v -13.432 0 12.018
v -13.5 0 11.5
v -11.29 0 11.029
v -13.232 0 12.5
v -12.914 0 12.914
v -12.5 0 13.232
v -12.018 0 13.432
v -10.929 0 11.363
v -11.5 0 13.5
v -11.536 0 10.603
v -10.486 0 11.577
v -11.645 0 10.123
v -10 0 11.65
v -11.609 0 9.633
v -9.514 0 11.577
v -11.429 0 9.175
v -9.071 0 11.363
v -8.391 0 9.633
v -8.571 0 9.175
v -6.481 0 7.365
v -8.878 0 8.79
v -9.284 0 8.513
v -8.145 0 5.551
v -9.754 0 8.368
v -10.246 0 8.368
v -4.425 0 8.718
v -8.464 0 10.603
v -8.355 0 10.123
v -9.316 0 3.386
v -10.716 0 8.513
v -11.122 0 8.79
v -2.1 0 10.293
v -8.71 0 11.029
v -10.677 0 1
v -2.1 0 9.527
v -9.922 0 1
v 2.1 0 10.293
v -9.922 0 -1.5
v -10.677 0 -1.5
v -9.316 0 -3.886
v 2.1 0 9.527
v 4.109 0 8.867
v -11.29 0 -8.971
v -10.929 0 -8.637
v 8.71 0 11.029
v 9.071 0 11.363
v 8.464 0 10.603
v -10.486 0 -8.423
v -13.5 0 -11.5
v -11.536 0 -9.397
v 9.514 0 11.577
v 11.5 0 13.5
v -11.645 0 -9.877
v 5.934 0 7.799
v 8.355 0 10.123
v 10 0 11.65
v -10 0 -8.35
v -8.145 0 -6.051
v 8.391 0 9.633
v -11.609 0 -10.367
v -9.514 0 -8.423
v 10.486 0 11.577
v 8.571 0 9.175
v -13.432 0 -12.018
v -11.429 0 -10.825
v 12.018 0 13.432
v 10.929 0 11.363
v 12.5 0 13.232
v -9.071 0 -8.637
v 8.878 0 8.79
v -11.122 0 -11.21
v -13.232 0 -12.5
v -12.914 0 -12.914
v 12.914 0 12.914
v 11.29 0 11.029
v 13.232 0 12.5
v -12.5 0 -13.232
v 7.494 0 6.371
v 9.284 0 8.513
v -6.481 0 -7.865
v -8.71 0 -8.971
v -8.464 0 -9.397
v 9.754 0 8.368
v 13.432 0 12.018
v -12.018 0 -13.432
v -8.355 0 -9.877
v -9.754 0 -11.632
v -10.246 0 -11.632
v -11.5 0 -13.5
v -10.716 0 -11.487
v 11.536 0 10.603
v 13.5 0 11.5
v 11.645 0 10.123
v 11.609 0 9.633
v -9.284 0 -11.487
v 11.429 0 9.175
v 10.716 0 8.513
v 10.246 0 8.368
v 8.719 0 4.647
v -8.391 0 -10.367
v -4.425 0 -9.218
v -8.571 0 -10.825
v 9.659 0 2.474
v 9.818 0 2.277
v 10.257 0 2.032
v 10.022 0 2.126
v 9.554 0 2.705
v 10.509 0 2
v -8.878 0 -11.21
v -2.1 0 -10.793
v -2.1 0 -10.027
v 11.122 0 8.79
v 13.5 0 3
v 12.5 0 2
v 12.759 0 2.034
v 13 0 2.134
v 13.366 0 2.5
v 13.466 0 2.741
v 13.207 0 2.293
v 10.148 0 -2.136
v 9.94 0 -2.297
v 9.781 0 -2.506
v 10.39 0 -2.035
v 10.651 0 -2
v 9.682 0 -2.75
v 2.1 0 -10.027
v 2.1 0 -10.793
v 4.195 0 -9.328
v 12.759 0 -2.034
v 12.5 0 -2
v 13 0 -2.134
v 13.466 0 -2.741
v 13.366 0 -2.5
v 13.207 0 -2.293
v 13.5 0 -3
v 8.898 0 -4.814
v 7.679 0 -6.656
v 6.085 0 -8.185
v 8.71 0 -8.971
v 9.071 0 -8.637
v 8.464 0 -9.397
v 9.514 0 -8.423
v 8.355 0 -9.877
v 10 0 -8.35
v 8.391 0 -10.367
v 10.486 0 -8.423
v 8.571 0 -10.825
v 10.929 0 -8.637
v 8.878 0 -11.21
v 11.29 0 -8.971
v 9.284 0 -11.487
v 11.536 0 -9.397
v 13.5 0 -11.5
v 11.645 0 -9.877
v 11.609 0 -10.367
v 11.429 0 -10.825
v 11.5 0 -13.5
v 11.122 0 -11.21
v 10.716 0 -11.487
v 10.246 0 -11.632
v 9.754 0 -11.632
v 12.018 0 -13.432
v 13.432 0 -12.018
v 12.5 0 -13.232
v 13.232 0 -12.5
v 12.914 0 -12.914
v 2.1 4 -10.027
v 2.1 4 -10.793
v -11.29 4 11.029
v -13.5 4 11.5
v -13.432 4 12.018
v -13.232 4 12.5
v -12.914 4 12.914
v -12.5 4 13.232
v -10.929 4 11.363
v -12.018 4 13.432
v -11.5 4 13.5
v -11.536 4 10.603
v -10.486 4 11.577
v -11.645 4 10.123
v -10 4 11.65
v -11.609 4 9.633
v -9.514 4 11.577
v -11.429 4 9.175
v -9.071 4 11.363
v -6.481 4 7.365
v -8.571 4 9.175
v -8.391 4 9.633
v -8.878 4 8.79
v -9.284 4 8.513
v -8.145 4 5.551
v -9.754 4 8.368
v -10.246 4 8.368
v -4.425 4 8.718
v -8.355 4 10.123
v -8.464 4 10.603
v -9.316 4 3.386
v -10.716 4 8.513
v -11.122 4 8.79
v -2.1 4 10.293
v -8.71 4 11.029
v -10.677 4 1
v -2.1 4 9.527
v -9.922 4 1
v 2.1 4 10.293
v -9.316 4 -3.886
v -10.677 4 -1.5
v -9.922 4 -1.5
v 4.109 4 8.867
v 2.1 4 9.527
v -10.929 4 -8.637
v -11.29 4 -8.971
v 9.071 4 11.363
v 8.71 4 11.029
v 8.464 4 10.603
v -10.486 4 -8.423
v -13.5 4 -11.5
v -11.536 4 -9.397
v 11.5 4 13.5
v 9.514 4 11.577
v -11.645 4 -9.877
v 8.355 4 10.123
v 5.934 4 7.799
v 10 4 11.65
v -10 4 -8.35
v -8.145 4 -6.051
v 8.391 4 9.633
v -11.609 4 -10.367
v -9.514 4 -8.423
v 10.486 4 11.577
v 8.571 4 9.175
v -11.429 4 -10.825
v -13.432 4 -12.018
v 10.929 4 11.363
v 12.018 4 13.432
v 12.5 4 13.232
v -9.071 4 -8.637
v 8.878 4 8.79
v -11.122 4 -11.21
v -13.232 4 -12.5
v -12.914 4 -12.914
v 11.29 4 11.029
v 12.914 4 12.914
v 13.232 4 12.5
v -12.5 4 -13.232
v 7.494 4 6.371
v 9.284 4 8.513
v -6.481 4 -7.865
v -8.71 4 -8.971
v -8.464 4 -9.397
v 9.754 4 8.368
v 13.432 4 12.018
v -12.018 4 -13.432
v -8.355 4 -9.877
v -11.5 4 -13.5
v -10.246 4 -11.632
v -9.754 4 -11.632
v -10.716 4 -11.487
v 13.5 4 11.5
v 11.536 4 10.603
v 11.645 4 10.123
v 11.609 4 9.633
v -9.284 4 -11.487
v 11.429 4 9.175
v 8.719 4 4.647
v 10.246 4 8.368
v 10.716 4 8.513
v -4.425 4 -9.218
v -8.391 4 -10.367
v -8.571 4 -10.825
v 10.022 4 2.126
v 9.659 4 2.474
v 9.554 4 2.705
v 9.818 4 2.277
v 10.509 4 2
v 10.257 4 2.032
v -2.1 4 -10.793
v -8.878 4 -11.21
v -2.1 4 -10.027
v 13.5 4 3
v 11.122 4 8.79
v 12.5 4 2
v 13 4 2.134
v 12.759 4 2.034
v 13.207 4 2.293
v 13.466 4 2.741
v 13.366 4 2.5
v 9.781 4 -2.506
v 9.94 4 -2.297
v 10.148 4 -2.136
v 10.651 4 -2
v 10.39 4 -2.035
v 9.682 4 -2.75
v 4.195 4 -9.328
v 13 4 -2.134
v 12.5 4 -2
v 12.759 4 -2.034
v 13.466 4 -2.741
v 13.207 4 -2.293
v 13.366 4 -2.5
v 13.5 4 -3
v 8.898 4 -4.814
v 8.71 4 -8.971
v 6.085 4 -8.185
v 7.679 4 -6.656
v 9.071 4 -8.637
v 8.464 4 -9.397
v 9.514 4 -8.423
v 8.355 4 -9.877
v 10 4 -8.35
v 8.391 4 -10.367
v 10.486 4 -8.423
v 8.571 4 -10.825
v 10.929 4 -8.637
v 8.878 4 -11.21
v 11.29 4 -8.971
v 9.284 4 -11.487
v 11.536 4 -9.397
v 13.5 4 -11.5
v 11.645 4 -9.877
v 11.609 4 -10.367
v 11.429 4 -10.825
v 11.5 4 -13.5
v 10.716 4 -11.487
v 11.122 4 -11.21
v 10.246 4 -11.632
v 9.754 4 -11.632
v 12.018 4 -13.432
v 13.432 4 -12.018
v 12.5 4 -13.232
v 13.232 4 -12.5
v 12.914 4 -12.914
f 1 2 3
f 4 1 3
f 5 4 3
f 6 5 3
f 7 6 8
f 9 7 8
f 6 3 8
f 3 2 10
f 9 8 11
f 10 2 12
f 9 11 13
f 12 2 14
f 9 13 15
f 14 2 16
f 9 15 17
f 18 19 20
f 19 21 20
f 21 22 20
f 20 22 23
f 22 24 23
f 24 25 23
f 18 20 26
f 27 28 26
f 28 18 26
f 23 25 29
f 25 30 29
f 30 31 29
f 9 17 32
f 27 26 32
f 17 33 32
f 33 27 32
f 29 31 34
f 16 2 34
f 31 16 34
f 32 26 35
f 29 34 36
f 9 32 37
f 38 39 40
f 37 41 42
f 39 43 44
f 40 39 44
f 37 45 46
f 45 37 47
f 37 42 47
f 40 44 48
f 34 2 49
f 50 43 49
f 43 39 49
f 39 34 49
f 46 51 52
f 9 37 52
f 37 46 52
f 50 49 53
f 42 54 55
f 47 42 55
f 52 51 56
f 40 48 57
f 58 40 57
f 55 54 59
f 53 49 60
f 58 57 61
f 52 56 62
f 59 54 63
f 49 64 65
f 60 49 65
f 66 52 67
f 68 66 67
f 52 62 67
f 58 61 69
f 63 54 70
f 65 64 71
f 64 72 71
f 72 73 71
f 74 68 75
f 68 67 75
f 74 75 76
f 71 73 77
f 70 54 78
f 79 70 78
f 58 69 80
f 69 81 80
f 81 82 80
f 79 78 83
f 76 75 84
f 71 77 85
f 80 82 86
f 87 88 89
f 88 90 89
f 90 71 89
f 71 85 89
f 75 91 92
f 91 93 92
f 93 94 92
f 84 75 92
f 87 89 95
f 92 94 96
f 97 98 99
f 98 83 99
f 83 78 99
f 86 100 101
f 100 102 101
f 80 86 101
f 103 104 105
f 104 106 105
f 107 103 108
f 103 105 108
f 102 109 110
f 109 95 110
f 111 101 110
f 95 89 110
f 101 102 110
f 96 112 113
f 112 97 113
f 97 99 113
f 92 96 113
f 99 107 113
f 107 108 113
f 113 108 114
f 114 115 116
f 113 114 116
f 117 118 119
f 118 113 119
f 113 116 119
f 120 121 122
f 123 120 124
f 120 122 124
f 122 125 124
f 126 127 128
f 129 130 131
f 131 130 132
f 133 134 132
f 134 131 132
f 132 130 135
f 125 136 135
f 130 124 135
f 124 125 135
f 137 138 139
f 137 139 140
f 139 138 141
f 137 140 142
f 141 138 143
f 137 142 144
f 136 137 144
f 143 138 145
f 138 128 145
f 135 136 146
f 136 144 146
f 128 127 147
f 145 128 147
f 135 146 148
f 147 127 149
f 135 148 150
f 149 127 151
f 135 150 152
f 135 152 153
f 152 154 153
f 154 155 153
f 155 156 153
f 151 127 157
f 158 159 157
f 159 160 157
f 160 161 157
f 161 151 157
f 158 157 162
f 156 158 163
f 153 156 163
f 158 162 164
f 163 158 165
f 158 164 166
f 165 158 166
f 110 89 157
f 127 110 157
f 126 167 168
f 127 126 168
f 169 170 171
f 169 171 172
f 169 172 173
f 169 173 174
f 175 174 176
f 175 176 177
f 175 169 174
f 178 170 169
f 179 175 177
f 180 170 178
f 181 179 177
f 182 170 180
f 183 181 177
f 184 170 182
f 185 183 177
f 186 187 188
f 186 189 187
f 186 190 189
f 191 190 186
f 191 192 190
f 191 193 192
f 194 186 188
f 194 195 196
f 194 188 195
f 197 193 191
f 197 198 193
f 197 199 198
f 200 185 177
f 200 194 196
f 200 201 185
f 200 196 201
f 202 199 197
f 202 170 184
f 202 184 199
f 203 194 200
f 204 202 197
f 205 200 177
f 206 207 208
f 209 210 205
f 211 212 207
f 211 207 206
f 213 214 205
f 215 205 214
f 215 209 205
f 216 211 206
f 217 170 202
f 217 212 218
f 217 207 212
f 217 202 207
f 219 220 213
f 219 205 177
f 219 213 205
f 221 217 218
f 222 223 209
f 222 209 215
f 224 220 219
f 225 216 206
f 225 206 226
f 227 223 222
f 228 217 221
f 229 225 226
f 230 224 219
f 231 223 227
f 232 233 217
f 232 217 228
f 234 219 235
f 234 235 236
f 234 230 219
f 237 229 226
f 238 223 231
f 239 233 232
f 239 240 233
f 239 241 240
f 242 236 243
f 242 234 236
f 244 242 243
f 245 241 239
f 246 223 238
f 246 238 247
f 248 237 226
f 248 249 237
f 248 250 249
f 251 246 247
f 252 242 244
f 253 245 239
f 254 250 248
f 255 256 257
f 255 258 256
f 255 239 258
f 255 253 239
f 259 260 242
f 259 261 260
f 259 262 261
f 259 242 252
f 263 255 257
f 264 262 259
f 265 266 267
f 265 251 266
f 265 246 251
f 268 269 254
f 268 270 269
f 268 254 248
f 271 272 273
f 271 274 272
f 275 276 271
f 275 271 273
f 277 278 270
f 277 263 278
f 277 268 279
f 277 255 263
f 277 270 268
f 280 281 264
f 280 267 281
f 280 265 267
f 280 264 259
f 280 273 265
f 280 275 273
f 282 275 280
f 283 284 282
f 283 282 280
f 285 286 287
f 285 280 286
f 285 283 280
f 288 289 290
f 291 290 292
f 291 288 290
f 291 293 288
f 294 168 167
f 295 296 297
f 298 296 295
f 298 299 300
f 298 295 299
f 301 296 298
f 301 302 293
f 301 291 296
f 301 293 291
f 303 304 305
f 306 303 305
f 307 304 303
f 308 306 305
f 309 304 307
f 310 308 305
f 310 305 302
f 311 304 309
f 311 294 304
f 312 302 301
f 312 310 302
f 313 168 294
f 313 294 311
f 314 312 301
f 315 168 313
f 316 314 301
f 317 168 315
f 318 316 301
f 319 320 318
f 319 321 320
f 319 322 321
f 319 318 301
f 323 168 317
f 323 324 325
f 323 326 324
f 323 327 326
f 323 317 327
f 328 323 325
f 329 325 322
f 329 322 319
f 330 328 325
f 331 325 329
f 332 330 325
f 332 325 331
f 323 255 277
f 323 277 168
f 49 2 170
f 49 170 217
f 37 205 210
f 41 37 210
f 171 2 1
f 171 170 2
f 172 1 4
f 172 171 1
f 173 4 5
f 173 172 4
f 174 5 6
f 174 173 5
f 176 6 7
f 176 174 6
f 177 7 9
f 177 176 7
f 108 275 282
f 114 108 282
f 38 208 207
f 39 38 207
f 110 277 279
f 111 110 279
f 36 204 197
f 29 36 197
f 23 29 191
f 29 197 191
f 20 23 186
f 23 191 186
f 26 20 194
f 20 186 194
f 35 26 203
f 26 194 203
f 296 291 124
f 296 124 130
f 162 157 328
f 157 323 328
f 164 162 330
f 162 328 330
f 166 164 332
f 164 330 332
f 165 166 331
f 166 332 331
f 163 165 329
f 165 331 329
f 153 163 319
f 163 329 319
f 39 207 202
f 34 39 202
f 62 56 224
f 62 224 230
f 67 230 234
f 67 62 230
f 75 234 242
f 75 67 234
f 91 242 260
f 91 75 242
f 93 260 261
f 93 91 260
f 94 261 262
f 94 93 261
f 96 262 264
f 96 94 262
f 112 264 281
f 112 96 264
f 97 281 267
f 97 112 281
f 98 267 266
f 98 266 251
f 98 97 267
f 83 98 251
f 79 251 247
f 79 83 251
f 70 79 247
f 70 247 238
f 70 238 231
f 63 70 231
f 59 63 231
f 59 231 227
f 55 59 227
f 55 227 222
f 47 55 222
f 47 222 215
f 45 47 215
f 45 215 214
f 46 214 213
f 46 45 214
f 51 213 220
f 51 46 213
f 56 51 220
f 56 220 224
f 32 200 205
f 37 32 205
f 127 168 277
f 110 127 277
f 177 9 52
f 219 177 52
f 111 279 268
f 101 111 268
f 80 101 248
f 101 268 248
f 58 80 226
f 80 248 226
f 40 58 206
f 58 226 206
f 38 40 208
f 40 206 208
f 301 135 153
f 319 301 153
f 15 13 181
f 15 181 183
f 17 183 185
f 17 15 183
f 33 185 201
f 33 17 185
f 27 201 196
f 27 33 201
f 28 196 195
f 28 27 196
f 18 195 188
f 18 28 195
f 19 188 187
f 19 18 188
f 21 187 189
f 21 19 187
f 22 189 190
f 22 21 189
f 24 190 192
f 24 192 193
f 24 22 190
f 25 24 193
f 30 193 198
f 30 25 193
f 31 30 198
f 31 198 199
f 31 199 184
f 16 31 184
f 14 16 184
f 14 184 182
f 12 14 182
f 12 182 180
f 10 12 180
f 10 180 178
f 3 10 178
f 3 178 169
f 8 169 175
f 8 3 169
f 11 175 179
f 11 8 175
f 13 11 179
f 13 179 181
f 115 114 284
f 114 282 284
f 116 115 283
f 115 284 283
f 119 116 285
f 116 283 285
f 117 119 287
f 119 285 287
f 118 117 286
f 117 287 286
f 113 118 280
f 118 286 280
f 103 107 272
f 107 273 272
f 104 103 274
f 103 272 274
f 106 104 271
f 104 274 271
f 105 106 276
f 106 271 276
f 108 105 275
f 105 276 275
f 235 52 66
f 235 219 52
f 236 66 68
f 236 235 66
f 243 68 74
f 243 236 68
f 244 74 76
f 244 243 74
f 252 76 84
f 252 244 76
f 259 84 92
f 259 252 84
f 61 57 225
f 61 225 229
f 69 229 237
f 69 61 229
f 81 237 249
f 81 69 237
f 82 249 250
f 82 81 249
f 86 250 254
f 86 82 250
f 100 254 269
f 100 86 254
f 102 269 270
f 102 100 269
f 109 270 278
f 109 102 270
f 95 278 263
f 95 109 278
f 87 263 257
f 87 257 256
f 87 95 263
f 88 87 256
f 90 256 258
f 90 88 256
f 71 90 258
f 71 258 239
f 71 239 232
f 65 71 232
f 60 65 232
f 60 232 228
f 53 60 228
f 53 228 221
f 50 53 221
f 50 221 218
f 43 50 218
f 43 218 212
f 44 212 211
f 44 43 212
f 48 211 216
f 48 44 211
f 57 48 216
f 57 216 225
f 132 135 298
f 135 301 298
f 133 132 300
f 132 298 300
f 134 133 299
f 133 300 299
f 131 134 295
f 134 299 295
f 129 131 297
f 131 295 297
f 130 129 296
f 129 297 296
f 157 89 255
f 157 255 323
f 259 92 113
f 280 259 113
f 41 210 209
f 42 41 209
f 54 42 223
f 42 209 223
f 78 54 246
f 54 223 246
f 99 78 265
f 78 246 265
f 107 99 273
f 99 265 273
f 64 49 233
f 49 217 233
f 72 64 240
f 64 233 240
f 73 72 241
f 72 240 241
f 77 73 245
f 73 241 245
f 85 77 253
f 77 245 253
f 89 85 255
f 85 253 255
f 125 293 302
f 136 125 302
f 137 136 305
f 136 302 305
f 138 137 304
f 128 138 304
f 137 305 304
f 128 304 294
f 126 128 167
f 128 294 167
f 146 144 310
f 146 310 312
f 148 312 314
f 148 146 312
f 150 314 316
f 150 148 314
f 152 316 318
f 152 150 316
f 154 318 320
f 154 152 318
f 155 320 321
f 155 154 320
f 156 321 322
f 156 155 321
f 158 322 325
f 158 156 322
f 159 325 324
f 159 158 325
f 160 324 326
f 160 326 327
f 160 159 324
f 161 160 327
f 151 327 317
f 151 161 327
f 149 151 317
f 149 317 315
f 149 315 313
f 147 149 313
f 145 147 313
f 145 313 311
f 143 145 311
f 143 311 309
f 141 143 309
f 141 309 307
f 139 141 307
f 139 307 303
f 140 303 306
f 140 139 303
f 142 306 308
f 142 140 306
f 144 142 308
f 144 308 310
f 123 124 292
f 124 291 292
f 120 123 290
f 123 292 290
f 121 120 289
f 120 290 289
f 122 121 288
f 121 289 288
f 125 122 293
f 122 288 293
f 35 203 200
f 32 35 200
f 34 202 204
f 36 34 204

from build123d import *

# Parameters (mm, degrees)
SKETCH1_W           = 27
SKETCH1_H           = 27
SKETCH1_R           = 1.65
BOSS_EXTRUDE1_DEPTH = 4
CUT_EXTRUDE1_DEPTH  = 20.506409203
FILLET2_R           = 2
SKETCH5_W           = 14.325764552
SKETCH5_H           = 4
CUT_EXTRUDE2_DEPTH  = 20.506409203
FILLET3_R           = 1


with BuildPart() as part:
    # Sketch1 → Boss-Extrude1 (new body)
    with BuildSketch(Plane(origin=(0, 0, 0), x_dir=(1, 0, 0), z_dir=(0, 1, 0))):
        Rectangle(SKETCH1_W, SKETCH1_H)
        with Locations(Location((10, 10, 0), (0, 0, 270))):
            Circle(SKETCH1_R, mode=Mode.SUBTRACT)
        with Locations(Location((10, -10, 0), (0, 0, 270))):
            Circle(SKETCH1_R, mode=Mode.SUBTRACT)
        with Locations(Location((-10, -10, 0), (0, 0, 270))):
            Circle(SKETCH1_R, mode=Mode.SUBTRACT)
        with Locations(Location((-10, 10, 0), (0, 0, 270))):
            Circle(SKETCH1_R, mode=Mode.SUBTRACT)
    extrude(amount=BOSS_EXTRUDE1_DEPTH)

    # Sketch2 → Cut-Extrude1 (cut, through all)
    with BuildSketch(Plane(origin=(0, 4, 0), x_dir=(1, 0, 0), z_dir=(0, 1, 0))):
        with BuildLine():
            Line((-9.921567416, 1.5), (-10.677078252, 1.5))
            Line((-10.677078252, 1.5), (-10.677078252, -1))
            Line((-10.677078252, -1), (-9.921567416, -1))
            ThreePointArc((-9.921567416, -1), (-7.36932915, -6.509658858), (-2.1, -9.527013859))
            Line((-2.1, -9.527013859), (-2.1, -10.292888598))
            Line((-2.1, -10.292888598), (2.1, -10.292888598))
            Line((2.1, -10.292888598), (2.1, -9.527013859))
            ThreePointArc((2.1, -9.527013859), (7.36932915, -6.509658858), (9.921567416, -1))
            Line((9.921567416, -1), (10.677078252, -1))
            Line((10.677078252, -1), (10.677078252, 1.5))
            Line((10.677078252, 1.5), (9.921567416, 1.5))
            ThreePointArc((9.921567416, 1.5), (7.36932915, 7.009658858), (2.1, 10.027013859))
            Line((2.1, 10.027013859), (2.1, 10.792888598))
            Line((2.1, 10.792888598), (-2.1, 10.792888598))
            Line((-2.1, 10.792888598), (-2.1, 10.027013859))
            ThreePointArc((-2.1, 10.027013859), (-7.36932915, 7.009658858), (-9.921567416, 1.5))
        make_face()
    extrude(amount=-CUT_EXTRUDE1_DEPTH, mode=Mode.SUBTRACT)

    # Fillet2
    fillet2_edges = [part.edges().sort_by_distance(p)[0] for p in [
        (13.5, 2, 13.5),
        (-13.5, 2, 13.5),
        (-13.5, 2, -13.5),
        (13.5, 2, -13.5),
    ]]
    fillet(fillet2_edges, radius=FILLET2_R)

    # Sketch5 → Cut-Extrude2 (cut, through all)
    with BuildSketch(Plane(origin=(0, 4, 0), x_dir=(1, 0, 0), z_dir=(0, 1, 0))):
        with Locations((10.779204511, 0)):
            Rectangle(SKETCH5_W, SKETCH5_H)
    extrude(amount=-CUT_EXTRUDE2_DEPTH, mode=Mode.SUBTRACT)

    # Fillet3
    fillet3_edges = [part.edges().sort_by_distance(p)[0] for p in [
        (9.743587635, 2, 2),
        (9.845684334, 2, -2),
        (13.5, 2, -2),
        (13.5, 2, 2),
    ]]
    fillet(fillet3_edges, radius=FILLET3_R)


solid = part.part
